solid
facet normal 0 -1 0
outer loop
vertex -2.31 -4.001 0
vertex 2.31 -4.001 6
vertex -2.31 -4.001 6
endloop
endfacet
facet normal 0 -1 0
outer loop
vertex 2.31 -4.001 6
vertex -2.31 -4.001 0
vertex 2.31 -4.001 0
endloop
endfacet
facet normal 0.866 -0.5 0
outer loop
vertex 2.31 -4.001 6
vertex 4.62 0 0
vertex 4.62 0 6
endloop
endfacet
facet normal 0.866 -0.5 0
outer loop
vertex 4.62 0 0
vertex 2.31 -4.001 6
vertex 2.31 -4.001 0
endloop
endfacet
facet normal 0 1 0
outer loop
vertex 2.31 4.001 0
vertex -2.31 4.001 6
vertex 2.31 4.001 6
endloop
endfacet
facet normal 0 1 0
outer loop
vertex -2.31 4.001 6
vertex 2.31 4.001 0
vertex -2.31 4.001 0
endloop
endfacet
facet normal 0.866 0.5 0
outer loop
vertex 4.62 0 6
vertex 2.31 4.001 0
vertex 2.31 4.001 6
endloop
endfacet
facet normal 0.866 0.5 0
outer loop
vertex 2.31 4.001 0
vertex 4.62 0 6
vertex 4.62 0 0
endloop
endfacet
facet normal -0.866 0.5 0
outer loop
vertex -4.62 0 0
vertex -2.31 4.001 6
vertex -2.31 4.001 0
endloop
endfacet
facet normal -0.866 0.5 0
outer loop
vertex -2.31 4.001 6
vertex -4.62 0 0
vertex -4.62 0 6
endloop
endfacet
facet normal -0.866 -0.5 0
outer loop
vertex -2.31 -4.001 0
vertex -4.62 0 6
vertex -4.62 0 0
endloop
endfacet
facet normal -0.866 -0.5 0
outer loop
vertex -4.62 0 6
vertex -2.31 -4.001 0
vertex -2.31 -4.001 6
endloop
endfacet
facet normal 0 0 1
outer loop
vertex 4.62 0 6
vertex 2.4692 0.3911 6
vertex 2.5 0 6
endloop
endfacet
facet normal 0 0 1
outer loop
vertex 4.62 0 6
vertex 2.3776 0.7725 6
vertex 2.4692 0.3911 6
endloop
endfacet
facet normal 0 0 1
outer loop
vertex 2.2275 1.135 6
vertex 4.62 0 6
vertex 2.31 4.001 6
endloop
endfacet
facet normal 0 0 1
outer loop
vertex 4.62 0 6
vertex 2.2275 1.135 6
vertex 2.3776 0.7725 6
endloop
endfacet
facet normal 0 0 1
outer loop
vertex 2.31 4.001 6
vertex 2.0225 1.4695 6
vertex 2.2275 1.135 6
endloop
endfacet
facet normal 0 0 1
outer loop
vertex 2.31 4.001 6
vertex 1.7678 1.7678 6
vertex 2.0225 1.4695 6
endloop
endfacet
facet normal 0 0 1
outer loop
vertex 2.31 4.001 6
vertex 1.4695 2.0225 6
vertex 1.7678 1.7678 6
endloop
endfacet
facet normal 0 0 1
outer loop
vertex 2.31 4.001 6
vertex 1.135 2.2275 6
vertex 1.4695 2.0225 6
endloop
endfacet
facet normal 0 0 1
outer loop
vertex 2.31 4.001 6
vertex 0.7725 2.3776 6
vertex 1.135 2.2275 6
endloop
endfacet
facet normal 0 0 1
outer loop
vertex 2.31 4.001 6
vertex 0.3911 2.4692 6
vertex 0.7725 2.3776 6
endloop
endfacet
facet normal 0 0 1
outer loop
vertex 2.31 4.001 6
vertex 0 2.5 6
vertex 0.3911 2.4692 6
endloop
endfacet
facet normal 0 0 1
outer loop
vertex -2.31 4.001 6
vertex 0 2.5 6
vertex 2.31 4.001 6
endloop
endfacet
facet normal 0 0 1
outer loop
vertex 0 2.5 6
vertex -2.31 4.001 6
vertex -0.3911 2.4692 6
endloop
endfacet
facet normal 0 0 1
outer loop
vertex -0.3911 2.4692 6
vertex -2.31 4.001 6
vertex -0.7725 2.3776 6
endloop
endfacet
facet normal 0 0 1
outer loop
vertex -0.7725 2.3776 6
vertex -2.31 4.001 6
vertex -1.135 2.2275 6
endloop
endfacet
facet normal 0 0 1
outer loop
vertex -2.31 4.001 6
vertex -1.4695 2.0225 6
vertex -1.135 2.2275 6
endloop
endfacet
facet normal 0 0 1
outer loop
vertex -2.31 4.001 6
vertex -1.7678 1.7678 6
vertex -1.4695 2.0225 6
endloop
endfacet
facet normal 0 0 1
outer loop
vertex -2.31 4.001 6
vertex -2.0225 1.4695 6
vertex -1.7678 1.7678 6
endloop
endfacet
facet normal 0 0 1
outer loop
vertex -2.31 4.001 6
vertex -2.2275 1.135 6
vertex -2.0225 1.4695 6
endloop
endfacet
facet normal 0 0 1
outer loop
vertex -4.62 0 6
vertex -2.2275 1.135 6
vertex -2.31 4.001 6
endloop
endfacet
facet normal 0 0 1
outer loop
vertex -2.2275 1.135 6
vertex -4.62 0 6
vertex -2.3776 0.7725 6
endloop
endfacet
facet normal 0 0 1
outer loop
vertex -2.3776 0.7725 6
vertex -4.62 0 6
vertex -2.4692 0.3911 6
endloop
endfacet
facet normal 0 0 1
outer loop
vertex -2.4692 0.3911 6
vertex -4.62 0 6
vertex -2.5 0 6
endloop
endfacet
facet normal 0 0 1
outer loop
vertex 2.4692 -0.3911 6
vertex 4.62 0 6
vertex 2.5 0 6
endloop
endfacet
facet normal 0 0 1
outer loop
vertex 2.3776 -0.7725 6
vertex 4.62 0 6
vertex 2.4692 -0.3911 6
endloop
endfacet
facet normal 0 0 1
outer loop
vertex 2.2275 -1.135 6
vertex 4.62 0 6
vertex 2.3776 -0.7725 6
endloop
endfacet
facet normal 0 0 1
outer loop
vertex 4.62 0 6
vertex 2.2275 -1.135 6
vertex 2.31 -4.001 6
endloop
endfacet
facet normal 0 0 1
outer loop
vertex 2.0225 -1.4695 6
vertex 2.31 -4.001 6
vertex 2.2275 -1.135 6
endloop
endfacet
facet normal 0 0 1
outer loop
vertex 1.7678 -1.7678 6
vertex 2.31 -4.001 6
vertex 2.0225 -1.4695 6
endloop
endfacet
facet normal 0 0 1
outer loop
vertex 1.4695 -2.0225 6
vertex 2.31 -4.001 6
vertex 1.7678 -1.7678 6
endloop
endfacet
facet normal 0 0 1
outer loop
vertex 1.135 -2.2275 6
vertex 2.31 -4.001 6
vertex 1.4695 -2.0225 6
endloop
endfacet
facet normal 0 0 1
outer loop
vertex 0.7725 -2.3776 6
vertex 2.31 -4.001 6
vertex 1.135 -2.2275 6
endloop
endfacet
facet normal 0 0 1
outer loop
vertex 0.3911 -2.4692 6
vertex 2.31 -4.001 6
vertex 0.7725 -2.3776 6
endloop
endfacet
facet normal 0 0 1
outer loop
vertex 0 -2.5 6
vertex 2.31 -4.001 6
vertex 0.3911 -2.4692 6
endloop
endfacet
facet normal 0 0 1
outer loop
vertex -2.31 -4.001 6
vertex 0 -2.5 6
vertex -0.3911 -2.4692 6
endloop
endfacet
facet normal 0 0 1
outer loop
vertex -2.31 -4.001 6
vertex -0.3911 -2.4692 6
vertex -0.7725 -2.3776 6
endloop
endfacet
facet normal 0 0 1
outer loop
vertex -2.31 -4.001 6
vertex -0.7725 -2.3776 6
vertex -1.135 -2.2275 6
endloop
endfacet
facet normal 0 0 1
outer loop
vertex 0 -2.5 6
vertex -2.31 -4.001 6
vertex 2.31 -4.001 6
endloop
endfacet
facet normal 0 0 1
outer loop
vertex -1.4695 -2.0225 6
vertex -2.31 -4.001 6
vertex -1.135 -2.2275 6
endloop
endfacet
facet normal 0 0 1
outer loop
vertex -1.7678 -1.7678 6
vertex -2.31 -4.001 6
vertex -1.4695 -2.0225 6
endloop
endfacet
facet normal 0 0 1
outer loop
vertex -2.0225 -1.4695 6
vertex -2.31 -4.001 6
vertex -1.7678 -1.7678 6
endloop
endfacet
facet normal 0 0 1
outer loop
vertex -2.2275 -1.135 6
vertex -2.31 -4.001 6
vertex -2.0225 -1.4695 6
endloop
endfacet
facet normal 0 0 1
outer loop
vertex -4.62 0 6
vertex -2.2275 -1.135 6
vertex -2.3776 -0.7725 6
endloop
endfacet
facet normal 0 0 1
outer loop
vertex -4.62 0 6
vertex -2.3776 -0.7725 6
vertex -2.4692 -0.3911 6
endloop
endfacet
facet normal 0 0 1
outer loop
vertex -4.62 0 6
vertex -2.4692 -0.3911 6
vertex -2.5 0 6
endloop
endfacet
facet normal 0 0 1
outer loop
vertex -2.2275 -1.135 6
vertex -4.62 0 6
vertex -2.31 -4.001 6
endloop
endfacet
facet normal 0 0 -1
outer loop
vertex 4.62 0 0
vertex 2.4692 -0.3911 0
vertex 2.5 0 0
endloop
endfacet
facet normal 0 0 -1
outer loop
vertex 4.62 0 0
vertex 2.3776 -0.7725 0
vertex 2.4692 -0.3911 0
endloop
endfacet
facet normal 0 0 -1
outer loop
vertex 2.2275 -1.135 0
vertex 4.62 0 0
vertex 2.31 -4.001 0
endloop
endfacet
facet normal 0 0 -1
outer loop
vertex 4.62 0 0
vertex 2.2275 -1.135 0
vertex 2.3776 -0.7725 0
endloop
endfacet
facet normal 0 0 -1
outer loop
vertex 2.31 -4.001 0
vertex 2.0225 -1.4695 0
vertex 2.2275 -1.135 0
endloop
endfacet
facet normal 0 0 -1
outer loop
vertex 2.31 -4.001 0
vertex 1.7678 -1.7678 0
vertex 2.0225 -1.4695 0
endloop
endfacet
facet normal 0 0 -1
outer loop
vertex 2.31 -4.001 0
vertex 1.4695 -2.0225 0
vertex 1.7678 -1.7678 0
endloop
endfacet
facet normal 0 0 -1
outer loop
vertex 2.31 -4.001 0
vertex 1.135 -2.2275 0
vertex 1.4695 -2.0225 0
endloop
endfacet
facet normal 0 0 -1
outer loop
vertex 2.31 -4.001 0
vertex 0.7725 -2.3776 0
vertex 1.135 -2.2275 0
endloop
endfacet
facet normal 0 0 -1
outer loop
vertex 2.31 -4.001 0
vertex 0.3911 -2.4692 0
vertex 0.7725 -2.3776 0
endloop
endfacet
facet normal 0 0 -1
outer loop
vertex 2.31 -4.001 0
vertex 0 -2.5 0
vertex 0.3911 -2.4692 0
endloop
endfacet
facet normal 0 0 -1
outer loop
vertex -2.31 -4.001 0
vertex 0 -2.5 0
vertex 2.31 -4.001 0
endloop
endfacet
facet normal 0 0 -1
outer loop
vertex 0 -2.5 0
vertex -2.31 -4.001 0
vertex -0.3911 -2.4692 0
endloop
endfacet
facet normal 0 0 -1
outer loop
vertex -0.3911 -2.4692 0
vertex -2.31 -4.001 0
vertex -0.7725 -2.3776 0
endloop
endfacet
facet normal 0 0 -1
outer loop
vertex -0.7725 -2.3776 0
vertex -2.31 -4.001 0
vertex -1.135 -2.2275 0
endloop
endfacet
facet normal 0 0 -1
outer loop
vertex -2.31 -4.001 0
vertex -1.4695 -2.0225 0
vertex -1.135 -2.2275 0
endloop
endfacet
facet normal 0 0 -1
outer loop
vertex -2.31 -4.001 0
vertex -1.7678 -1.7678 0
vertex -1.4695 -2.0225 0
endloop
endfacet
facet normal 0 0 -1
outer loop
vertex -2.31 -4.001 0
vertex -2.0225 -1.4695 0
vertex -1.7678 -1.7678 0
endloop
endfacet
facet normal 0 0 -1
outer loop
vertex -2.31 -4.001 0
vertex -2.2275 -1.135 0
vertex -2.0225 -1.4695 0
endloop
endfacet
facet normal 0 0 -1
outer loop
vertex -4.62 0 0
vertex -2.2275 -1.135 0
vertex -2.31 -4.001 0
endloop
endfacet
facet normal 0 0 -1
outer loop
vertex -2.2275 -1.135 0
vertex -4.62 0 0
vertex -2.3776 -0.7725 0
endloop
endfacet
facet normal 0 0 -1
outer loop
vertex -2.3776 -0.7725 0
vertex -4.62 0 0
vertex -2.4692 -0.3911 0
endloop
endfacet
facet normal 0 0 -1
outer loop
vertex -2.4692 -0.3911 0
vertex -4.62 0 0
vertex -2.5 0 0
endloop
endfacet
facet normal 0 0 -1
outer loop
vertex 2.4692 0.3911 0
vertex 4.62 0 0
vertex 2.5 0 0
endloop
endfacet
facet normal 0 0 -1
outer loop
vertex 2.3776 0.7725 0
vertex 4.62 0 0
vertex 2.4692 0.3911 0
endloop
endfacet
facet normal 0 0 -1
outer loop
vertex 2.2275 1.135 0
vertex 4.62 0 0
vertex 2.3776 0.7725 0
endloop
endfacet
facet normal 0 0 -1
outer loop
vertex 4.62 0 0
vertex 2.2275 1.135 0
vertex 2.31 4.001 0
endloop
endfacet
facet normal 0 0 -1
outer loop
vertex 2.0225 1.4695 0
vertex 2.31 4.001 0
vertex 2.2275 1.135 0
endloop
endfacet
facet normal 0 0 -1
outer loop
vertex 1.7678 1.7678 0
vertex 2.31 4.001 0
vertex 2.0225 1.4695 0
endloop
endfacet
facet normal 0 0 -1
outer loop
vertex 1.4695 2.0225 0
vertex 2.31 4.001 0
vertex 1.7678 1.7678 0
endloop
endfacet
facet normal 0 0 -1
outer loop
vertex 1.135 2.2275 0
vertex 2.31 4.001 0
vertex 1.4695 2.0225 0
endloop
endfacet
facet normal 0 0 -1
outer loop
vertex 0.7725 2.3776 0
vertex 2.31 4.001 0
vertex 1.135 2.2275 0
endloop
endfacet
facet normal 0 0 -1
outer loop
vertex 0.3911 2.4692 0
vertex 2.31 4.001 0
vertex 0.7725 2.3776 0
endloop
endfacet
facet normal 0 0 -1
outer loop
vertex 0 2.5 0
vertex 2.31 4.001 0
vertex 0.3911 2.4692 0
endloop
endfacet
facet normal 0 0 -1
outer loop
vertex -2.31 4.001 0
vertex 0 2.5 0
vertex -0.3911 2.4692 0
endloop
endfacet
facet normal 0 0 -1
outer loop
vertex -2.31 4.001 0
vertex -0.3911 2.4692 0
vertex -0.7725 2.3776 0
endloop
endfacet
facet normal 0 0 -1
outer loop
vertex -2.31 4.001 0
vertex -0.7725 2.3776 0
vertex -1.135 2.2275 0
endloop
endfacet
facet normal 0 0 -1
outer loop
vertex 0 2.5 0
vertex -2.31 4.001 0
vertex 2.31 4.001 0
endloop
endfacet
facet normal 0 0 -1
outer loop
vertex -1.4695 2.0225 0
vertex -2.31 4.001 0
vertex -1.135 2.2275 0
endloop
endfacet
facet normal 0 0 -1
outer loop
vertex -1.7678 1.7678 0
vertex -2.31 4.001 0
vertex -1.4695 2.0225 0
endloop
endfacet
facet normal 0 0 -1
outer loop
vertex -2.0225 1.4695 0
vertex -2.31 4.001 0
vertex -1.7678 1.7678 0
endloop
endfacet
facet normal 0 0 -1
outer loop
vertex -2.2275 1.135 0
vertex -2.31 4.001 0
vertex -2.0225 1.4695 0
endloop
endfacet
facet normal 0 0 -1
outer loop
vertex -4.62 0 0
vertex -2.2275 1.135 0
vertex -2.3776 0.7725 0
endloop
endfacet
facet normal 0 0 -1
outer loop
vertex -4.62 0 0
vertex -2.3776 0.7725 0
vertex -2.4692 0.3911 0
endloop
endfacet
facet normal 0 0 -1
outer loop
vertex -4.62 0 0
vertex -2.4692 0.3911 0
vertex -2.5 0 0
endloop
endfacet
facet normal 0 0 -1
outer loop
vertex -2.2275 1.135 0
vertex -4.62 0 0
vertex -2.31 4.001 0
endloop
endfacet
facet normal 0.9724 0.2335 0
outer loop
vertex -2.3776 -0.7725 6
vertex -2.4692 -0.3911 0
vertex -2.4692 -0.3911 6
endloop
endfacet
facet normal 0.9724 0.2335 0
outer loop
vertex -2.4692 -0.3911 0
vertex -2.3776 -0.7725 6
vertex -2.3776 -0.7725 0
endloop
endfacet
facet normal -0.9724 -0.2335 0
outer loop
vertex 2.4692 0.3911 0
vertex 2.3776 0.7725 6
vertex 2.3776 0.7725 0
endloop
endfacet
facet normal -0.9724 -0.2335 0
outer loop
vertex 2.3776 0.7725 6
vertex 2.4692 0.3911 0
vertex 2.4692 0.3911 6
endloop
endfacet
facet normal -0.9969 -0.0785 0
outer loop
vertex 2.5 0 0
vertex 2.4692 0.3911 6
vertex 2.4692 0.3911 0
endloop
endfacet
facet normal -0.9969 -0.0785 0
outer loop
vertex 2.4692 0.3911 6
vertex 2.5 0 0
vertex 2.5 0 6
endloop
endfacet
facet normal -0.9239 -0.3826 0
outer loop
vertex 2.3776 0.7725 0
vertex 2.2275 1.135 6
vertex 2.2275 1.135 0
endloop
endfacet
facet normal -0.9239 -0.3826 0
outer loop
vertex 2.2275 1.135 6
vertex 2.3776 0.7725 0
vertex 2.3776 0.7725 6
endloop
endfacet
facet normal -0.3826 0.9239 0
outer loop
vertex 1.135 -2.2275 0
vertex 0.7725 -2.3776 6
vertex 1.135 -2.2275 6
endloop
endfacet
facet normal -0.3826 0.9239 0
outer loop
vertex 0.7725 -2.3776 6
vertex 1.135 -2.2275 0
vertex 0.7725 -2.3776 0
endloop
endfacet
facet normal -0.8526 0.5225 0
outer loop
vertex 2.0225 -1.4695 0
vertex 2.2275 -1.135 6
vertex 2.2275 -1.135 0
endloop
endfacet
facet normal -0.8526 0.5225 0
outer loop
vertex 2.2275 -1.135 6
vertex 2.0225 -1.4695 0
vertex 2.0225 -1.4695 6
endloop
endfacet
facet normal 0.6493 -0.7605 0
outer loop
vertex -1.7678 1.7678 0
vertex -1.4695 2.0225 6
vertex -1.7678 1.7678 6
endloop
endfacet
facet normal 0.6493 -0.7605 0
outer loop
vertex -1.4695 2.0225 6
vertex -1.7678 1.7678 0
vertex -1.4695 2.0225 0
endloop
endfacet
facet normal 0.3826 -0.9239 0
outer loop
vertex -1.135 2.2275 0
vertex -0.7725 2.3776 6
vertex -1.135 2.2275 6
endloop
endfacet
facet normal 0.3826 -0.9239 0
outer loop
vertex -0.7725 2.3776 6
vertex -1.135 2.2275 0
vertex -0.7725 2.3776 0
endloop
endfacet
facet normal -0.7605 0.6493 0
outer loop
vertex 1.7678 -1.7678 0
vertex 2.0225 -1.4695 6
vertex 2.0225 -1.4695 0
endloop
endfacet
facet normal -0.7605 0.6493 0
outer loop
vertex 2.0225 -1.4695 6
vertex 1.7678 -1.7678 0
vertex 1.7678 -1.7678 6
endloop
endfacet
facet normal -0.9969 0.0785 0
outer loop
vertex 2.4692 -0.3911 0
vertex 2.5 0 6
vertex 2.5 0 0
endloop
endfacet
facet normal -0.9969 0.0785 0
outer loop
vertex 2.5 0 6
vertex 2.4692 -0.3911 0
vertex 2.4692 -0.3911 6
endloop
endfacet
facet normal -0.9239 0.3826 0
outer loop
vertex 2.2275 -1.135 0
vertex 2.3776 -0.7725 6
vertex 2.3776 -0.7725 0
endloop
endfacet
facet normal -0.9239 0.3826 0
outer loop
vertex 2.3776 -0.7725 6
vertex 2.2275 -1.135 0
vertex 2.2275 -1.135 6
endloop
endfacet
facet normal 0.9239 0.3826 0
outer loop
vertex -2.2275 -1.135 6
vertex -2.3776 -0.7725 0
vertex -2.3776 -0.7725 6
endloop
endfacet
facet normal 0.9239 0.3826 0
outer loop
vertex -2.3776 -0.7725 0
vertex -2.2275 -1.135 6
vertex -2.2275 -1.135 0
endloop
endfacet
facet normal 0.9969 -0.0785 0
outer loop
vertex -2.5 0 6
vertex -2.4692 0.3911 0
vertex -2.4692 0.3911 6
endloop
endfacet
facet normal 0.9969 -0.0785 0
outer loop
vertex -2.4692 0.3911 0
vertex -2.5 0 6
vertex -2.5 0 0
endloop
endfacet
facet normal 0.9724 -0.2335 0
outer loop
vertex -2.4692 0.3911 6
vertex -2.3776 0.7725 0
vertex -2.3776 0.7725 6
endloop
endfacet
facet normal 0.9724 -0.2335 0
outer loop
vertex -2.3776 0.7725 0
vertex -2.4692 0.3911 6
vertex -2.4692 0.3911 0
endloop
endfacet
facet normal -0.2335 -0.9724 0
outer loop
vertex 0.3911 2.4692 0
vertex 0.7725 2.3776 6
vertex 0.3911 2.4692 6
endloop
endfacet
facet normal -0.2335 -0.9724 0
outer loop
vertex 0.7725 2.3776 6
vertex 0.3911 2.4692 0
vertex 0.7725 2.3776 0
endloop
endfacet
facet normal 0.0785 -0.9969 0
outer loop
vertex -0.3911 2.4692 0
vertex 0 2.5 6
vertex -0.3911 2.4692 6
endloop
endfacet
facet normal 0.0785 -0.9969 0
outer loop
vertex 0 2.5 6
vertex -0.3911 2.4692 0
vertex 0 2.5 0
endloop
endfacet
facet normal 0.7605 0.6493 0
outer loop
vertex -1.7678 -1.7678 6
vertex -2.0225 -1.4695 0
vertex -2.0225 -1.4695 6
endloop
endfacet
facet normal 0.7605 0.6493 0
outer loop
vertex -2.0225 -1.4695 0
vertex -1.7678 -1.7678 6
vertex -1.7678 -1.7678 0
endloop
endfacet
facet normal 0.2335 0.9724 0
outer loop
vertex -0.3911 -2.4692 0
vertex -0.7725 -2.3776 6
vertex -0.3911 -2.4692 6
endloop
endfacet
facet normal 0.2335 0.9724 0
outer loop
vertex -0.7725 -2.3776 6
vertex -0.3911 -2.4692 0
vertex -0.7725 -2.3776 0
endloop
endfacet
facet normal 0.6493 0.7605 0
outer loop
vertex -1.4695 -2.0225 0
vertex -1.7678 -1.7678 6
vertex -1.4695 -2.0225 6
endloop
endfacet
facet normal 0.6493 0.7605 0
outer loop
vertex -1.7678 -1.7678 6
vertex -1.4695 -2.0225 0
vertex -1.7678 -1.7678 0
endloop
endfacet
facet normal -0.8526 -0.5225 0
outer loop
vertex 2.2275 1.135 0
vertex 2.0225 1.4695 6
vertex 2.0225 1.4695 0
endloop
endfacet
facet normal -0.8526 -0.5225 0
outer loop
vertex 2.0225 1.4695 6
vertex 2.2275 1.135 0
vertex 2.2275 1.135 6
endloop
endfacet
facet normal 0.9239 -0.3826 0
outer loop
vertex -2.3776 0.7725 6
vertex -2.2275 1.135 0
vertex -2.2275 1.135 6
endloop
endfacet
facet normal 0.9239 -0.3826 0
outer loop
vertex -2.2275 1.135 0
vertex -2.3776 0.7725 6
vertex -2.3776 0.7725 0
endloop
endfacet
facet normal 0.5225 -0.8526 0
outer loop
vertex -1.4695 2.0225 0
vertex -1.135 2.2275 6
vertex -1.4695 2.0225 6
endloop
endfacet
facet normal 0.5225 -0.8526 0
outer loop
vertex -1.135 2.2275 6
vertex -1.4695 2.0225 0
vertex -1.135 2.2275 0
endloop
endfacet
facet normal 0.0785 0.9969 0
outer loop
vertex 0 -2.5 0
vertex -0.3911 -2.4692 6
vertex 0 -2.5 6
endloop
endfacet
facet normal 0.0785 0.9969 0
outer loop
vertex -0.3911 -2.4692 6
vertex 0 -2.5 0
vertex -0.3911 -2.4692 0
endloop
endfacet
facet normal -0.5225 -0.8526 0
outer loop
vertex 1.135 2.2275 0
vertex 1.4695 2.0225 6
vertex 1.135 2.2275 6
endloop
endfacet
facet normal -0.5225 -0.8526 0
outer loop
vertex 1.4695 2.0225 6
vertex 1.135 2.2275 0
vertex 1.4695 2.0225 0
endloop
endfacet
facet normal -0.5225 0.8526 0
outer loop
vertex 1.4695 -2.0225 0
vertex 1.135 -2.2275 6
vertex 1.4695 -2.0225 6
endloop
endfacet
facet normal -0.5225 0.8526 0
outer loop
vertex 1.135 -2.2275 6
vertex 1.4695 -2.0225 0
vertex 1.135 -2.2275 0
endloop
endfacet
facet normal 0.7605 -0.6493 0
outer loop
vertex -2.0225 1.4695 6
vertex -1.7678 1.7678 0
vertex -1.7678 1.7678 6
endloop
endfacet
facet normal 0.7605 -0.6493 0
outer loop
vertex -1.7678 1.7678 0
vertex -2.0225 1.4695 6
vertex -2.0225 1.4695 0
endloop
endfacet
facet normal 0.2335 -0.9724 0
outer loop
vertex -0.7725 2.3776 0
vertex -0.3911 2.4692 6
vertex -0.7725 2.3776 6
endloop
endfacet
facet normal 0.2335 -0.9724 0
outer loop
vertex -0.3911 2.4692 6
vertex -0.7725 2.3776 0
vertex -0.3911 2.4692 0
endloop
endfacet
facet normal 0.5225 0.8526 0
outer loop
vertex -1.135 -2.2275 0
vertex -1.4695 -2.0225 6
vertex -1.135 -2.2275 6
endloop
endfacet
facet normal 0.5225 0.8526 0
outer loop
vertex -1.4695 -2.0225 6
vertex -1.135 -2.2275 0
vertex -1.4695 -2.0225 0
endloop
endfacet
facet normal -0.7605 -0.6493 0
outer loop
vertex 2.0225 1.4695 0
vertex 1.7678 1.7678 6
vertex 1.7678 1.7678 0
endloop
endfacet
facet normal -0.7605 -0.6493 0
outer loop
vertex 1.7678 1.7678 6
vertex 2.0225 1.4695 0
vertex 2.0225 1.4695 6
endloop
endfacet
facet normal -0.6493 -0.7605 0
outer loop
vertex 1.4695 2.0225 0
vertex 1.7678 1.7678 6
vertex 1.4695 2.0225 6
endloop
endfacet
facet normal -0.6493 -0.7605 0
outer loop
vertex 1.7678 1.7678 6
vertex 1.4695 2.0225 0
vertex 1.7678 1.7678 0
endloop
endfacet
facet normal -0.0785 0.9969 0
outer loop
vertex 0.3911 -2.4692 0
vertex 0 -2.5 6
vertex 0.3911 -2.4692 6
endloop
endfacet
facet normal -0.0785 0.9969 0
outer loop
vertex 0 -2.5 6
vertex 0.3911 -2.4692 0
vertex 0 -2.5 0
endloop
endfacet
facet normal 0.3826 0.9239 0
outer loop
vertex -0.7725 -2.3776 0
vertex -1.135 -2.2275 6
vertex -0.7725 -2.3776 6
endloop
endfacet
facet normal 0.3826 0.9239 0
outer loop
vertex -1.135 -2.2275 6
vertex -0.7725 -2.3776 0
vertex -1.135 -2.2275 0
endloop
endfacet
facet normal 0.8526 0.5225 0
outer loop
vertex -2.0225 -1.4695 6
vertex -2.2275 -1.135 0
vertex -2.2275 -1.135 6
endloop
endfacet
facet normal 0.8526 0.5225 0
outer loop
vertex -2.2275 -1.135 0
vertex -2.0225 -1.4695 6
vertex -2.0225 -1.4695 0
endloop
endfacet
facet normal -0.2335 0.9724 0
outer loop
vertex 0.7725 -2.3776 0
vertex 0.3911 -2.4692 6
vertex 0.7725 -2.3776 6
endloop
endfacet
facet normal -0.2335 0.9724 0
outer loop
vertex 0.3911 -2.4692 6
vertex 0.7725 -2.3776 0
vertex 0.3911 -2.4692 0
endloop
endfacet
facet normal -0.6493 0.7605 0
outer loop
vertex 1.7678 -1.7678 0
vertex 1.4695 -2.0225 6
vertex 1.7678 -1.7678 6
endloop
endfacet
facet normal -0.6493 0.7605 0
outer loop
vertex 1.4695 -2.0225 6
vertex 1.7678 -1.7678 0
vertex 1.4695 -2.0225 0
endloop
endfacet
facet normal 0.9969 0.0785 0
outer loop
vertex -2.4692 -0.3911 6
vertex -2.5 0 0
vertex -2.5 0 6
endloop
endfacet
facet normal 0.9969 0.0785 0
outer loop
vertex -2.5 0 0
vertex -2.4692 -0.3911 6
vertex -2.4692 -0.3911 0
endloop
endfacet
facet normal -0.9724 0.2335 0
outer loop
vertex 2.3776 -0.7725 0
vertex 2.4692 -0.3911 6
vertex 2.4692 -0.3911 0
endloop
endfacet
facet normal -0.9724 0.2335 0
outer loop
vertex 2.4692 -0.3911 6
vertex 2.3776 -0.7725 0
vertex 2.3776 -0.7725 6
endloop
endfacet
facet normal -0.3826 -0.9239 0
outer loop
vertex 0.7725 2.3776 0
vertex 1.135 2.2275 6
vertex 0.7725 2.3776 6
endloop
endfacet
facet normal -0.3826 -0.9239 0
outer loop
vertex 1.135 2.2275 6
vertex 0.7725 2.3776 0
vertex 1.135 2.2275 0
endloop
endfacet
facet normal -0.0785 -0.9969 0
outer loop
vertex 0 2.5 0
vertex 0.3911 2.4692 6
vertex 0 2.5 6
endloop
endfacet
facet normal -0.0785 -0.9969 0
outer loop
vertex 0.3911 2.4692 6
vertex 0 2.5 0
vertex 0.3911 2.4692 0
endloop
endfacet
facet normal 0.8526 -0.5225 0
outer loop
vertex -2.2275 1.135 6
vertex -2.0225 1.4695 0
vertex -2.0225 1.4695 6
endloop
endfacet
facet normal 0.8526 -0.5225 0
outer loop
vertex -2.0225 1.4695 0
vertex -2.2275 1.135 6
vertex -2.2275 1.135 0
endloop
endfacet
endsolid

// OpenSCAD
$fa = 2;
$fs = 0.4;

module prop_nut() {
  color("#c0c0c4")
    difference() {
      cylinder(h = 6, d = 9.24, $fn = 6);
      translate([0, 0, -1])
        cylinder(h = 8, d = 5);
    }
}

prop_nut();
